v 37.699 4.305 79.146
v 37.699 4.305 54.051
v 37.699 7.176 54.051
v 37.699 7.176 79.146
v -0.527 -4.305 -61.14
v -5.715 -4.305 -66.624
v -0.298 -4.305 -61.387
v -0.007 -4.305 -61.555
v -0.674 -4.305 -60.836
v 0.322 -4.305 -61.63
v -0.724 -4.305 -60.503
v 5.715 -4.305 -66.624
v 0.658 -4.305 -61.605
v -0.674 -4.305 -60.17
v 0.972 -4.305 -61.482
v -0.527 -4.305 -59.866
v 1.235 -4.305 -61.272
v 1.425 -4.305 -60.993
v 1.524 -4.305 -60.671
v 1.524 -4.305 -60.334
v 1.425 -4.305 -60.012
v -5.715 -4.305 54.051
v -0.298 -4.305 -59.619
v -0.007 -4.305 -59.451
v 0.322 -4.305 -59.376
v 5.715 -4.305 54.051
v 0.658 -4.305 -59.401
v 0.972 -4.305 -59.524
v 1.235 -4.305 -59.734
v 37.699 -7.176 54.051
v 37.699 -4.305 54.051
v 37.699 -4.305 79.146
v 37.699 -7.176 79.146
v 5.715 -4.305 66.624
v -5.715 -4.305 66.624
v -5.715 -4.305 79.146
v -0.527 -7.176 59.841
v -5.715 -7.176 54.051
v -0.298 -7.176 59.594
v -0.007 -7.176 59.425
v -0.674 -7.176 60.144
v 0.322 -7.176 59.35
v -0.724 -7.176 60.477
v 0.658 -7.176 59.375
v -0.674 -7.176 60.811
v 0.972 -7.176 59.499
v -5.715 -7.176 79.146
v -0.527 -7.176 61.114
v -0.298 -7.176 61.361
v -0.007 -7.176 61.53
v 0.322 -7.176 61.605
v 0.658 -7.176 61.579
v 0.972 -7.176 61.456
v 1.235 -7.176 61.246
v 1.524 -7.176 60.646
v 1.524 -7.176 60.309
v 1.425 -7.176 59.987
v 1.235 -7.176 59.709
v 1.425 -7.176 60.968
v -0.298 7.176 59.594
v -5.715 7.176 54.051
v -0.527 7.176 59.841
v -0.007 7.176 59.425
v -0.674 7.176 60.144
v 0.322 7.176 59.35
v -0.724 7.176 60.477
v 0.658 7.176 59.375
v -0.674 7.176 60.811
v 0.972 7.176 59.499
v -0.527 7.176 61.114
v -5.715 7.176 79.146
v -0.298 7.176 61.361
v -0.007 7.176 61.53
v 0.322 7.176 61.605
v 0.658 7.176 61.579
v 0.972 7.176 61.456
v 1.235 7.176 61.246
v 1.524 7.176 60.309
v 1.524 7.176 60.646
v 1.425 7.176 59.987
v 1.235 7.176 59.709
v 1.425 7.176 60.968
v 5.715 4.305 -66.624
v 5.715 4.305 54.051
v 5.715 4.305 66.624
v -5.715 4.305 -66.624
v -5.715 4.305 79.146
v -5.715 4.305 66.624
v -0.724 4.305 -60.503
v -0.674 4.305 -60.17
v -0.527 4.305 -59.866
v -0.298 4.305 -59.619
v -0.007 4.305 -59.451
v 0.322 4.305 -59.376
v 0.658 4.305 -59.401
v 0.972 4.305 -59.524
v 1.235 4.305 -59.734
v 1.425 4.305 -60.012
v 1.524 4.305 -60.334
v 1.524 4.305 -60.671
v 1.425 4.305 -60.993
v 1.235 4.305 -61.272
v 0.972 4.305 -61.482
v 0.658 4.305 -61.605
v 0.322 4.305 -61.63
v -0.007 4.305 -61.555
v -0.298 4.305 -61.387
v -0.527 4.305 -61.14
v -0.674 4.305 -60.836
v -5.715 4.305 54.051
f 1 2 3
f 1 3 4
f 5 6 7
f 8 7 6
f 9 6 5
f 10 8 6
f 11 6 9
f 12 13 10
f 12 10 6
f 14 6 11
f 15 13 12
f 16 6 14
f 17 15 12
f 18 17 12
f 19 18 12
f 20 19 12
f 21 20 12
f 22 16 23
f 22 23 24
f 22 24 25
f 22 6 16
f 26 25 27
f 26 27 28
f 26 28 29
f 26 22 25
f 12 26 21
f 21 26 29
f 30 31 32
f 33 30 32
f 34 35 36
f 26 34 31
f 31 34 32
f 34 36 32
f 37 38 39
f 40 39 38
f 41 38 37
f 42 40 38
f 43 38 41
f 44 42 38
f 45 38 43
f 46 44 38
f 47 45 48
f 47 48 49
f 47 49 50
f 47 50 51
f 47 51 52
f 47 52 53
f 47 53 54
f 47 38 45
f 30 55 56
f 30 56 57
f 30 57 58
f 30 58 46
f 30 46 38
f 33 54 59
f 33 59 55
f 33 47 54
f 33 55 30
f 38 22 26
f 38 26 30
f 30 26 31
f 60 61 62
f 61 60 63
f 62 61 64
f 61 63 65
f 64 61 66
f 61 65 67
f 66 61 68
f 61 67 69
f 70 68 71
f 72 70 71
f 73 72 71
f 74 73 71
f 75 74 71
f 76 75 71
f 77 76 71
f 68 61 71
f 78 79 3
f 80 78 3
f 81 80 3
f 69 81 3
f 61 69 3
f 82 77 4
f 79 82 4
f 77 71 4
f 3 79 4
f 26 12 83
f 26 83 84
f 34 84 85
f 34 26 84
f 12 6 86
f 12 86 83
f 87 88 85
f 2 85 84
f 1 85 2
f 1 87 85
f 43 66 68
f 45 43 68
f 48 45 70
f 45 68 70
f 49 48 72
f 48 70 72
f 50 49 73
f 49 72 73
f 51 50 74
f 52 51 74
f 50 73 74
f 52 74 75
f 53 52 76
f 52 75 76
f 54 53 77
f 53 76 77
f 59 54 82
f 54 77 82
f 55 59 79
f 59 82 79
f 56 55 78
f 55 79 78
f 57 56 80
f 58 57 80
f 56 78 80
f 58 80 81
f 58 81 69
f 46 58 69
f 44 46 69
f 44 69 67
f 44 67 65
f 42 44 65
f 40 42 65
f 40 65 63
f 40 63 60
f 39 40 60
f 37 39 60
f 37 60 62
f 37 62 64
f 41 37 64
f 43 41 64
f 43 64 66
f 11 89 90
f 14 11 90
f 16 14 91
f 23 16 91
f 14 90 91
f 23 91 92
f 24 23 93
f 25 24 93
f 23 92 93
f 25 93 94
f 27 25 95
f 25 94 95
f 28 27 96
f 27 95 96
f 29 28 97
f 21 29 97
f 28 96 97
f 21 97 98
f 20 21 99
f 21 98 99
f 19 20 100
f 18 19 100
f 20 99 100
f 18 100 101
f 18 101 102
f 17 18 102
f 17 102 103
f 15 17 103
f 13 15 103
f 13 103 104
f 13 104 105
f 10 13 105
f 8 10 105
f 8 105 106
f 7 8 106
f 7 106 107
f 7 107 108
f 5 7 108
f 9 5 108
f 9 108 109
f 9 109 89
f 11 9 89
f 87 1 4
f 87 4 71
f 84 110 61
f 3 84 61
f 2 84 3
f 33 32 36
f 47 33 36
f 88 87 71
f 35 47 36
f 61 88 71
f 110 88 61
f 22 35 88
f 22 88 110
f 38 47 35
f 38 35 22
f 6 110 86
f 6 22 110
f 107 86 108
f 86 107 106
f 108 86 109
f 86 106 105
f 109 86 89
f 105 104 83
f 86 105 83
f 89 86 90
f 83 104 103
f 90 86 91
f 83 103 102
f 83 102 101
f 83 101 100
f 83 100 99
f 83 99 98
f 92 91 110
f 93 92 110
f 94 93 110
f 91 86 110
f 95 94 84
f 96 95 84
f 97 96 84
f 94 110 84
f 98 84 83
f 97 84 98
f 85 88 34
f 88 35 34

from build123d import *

# Parameters (mm, degrees)
F0_W     = 11.43
F0_H     = 133.2484
F1_DEPTH = 4.3053
F2_W     = 11.43
F2_H     = 12.573
F3_DEPTH = 2.8702
F7_D     = 2.2606
F8_D     = 2.2606


with BuildPart() as f1:
    # F0 (on Front) → F1 (new body, symmetric)
    with BuildSketch(Plane.XZ):
        Rectangle(F0_W, F0_H)
    extrude(amount=F1_DEPTH, both=True)

    # F2 (on face) → F3 (join)
    with BuildSketch(Plane.XZ.offset(4.3053)):
        Polygon((5.715, 66.6242), (5.715, 54.0512), (37.6988202333, 54.0512), (37.6988202333, 79.1464), (5.715, 79.1464), (-5.715, 79.1464), (-5.715, 66.6242), align=None)
        with Locations((0, 60.3377)):
            Rectangle(F2_W, F2_H)
    extrude(amount=F3_DEPTH)

    # F4: F1 across plane


with BuildPart() as f1_1:
    add(f1.part)
    add(f1.part.mirror(Plane.XZ))

    # F7 (through all)
    with Locations(Plane.XZ.offset(7.1755)):
        with Locations((0.4064, 60.4774)):
            Hole(F7_D / 2)

    # F8 (through all)
    with Locations(Plane.XZ.offset(4.3053)):
        with Locations((0.4064, -60.5028)):
            Hole(F8_D / 2)


solid = f1_1.part
